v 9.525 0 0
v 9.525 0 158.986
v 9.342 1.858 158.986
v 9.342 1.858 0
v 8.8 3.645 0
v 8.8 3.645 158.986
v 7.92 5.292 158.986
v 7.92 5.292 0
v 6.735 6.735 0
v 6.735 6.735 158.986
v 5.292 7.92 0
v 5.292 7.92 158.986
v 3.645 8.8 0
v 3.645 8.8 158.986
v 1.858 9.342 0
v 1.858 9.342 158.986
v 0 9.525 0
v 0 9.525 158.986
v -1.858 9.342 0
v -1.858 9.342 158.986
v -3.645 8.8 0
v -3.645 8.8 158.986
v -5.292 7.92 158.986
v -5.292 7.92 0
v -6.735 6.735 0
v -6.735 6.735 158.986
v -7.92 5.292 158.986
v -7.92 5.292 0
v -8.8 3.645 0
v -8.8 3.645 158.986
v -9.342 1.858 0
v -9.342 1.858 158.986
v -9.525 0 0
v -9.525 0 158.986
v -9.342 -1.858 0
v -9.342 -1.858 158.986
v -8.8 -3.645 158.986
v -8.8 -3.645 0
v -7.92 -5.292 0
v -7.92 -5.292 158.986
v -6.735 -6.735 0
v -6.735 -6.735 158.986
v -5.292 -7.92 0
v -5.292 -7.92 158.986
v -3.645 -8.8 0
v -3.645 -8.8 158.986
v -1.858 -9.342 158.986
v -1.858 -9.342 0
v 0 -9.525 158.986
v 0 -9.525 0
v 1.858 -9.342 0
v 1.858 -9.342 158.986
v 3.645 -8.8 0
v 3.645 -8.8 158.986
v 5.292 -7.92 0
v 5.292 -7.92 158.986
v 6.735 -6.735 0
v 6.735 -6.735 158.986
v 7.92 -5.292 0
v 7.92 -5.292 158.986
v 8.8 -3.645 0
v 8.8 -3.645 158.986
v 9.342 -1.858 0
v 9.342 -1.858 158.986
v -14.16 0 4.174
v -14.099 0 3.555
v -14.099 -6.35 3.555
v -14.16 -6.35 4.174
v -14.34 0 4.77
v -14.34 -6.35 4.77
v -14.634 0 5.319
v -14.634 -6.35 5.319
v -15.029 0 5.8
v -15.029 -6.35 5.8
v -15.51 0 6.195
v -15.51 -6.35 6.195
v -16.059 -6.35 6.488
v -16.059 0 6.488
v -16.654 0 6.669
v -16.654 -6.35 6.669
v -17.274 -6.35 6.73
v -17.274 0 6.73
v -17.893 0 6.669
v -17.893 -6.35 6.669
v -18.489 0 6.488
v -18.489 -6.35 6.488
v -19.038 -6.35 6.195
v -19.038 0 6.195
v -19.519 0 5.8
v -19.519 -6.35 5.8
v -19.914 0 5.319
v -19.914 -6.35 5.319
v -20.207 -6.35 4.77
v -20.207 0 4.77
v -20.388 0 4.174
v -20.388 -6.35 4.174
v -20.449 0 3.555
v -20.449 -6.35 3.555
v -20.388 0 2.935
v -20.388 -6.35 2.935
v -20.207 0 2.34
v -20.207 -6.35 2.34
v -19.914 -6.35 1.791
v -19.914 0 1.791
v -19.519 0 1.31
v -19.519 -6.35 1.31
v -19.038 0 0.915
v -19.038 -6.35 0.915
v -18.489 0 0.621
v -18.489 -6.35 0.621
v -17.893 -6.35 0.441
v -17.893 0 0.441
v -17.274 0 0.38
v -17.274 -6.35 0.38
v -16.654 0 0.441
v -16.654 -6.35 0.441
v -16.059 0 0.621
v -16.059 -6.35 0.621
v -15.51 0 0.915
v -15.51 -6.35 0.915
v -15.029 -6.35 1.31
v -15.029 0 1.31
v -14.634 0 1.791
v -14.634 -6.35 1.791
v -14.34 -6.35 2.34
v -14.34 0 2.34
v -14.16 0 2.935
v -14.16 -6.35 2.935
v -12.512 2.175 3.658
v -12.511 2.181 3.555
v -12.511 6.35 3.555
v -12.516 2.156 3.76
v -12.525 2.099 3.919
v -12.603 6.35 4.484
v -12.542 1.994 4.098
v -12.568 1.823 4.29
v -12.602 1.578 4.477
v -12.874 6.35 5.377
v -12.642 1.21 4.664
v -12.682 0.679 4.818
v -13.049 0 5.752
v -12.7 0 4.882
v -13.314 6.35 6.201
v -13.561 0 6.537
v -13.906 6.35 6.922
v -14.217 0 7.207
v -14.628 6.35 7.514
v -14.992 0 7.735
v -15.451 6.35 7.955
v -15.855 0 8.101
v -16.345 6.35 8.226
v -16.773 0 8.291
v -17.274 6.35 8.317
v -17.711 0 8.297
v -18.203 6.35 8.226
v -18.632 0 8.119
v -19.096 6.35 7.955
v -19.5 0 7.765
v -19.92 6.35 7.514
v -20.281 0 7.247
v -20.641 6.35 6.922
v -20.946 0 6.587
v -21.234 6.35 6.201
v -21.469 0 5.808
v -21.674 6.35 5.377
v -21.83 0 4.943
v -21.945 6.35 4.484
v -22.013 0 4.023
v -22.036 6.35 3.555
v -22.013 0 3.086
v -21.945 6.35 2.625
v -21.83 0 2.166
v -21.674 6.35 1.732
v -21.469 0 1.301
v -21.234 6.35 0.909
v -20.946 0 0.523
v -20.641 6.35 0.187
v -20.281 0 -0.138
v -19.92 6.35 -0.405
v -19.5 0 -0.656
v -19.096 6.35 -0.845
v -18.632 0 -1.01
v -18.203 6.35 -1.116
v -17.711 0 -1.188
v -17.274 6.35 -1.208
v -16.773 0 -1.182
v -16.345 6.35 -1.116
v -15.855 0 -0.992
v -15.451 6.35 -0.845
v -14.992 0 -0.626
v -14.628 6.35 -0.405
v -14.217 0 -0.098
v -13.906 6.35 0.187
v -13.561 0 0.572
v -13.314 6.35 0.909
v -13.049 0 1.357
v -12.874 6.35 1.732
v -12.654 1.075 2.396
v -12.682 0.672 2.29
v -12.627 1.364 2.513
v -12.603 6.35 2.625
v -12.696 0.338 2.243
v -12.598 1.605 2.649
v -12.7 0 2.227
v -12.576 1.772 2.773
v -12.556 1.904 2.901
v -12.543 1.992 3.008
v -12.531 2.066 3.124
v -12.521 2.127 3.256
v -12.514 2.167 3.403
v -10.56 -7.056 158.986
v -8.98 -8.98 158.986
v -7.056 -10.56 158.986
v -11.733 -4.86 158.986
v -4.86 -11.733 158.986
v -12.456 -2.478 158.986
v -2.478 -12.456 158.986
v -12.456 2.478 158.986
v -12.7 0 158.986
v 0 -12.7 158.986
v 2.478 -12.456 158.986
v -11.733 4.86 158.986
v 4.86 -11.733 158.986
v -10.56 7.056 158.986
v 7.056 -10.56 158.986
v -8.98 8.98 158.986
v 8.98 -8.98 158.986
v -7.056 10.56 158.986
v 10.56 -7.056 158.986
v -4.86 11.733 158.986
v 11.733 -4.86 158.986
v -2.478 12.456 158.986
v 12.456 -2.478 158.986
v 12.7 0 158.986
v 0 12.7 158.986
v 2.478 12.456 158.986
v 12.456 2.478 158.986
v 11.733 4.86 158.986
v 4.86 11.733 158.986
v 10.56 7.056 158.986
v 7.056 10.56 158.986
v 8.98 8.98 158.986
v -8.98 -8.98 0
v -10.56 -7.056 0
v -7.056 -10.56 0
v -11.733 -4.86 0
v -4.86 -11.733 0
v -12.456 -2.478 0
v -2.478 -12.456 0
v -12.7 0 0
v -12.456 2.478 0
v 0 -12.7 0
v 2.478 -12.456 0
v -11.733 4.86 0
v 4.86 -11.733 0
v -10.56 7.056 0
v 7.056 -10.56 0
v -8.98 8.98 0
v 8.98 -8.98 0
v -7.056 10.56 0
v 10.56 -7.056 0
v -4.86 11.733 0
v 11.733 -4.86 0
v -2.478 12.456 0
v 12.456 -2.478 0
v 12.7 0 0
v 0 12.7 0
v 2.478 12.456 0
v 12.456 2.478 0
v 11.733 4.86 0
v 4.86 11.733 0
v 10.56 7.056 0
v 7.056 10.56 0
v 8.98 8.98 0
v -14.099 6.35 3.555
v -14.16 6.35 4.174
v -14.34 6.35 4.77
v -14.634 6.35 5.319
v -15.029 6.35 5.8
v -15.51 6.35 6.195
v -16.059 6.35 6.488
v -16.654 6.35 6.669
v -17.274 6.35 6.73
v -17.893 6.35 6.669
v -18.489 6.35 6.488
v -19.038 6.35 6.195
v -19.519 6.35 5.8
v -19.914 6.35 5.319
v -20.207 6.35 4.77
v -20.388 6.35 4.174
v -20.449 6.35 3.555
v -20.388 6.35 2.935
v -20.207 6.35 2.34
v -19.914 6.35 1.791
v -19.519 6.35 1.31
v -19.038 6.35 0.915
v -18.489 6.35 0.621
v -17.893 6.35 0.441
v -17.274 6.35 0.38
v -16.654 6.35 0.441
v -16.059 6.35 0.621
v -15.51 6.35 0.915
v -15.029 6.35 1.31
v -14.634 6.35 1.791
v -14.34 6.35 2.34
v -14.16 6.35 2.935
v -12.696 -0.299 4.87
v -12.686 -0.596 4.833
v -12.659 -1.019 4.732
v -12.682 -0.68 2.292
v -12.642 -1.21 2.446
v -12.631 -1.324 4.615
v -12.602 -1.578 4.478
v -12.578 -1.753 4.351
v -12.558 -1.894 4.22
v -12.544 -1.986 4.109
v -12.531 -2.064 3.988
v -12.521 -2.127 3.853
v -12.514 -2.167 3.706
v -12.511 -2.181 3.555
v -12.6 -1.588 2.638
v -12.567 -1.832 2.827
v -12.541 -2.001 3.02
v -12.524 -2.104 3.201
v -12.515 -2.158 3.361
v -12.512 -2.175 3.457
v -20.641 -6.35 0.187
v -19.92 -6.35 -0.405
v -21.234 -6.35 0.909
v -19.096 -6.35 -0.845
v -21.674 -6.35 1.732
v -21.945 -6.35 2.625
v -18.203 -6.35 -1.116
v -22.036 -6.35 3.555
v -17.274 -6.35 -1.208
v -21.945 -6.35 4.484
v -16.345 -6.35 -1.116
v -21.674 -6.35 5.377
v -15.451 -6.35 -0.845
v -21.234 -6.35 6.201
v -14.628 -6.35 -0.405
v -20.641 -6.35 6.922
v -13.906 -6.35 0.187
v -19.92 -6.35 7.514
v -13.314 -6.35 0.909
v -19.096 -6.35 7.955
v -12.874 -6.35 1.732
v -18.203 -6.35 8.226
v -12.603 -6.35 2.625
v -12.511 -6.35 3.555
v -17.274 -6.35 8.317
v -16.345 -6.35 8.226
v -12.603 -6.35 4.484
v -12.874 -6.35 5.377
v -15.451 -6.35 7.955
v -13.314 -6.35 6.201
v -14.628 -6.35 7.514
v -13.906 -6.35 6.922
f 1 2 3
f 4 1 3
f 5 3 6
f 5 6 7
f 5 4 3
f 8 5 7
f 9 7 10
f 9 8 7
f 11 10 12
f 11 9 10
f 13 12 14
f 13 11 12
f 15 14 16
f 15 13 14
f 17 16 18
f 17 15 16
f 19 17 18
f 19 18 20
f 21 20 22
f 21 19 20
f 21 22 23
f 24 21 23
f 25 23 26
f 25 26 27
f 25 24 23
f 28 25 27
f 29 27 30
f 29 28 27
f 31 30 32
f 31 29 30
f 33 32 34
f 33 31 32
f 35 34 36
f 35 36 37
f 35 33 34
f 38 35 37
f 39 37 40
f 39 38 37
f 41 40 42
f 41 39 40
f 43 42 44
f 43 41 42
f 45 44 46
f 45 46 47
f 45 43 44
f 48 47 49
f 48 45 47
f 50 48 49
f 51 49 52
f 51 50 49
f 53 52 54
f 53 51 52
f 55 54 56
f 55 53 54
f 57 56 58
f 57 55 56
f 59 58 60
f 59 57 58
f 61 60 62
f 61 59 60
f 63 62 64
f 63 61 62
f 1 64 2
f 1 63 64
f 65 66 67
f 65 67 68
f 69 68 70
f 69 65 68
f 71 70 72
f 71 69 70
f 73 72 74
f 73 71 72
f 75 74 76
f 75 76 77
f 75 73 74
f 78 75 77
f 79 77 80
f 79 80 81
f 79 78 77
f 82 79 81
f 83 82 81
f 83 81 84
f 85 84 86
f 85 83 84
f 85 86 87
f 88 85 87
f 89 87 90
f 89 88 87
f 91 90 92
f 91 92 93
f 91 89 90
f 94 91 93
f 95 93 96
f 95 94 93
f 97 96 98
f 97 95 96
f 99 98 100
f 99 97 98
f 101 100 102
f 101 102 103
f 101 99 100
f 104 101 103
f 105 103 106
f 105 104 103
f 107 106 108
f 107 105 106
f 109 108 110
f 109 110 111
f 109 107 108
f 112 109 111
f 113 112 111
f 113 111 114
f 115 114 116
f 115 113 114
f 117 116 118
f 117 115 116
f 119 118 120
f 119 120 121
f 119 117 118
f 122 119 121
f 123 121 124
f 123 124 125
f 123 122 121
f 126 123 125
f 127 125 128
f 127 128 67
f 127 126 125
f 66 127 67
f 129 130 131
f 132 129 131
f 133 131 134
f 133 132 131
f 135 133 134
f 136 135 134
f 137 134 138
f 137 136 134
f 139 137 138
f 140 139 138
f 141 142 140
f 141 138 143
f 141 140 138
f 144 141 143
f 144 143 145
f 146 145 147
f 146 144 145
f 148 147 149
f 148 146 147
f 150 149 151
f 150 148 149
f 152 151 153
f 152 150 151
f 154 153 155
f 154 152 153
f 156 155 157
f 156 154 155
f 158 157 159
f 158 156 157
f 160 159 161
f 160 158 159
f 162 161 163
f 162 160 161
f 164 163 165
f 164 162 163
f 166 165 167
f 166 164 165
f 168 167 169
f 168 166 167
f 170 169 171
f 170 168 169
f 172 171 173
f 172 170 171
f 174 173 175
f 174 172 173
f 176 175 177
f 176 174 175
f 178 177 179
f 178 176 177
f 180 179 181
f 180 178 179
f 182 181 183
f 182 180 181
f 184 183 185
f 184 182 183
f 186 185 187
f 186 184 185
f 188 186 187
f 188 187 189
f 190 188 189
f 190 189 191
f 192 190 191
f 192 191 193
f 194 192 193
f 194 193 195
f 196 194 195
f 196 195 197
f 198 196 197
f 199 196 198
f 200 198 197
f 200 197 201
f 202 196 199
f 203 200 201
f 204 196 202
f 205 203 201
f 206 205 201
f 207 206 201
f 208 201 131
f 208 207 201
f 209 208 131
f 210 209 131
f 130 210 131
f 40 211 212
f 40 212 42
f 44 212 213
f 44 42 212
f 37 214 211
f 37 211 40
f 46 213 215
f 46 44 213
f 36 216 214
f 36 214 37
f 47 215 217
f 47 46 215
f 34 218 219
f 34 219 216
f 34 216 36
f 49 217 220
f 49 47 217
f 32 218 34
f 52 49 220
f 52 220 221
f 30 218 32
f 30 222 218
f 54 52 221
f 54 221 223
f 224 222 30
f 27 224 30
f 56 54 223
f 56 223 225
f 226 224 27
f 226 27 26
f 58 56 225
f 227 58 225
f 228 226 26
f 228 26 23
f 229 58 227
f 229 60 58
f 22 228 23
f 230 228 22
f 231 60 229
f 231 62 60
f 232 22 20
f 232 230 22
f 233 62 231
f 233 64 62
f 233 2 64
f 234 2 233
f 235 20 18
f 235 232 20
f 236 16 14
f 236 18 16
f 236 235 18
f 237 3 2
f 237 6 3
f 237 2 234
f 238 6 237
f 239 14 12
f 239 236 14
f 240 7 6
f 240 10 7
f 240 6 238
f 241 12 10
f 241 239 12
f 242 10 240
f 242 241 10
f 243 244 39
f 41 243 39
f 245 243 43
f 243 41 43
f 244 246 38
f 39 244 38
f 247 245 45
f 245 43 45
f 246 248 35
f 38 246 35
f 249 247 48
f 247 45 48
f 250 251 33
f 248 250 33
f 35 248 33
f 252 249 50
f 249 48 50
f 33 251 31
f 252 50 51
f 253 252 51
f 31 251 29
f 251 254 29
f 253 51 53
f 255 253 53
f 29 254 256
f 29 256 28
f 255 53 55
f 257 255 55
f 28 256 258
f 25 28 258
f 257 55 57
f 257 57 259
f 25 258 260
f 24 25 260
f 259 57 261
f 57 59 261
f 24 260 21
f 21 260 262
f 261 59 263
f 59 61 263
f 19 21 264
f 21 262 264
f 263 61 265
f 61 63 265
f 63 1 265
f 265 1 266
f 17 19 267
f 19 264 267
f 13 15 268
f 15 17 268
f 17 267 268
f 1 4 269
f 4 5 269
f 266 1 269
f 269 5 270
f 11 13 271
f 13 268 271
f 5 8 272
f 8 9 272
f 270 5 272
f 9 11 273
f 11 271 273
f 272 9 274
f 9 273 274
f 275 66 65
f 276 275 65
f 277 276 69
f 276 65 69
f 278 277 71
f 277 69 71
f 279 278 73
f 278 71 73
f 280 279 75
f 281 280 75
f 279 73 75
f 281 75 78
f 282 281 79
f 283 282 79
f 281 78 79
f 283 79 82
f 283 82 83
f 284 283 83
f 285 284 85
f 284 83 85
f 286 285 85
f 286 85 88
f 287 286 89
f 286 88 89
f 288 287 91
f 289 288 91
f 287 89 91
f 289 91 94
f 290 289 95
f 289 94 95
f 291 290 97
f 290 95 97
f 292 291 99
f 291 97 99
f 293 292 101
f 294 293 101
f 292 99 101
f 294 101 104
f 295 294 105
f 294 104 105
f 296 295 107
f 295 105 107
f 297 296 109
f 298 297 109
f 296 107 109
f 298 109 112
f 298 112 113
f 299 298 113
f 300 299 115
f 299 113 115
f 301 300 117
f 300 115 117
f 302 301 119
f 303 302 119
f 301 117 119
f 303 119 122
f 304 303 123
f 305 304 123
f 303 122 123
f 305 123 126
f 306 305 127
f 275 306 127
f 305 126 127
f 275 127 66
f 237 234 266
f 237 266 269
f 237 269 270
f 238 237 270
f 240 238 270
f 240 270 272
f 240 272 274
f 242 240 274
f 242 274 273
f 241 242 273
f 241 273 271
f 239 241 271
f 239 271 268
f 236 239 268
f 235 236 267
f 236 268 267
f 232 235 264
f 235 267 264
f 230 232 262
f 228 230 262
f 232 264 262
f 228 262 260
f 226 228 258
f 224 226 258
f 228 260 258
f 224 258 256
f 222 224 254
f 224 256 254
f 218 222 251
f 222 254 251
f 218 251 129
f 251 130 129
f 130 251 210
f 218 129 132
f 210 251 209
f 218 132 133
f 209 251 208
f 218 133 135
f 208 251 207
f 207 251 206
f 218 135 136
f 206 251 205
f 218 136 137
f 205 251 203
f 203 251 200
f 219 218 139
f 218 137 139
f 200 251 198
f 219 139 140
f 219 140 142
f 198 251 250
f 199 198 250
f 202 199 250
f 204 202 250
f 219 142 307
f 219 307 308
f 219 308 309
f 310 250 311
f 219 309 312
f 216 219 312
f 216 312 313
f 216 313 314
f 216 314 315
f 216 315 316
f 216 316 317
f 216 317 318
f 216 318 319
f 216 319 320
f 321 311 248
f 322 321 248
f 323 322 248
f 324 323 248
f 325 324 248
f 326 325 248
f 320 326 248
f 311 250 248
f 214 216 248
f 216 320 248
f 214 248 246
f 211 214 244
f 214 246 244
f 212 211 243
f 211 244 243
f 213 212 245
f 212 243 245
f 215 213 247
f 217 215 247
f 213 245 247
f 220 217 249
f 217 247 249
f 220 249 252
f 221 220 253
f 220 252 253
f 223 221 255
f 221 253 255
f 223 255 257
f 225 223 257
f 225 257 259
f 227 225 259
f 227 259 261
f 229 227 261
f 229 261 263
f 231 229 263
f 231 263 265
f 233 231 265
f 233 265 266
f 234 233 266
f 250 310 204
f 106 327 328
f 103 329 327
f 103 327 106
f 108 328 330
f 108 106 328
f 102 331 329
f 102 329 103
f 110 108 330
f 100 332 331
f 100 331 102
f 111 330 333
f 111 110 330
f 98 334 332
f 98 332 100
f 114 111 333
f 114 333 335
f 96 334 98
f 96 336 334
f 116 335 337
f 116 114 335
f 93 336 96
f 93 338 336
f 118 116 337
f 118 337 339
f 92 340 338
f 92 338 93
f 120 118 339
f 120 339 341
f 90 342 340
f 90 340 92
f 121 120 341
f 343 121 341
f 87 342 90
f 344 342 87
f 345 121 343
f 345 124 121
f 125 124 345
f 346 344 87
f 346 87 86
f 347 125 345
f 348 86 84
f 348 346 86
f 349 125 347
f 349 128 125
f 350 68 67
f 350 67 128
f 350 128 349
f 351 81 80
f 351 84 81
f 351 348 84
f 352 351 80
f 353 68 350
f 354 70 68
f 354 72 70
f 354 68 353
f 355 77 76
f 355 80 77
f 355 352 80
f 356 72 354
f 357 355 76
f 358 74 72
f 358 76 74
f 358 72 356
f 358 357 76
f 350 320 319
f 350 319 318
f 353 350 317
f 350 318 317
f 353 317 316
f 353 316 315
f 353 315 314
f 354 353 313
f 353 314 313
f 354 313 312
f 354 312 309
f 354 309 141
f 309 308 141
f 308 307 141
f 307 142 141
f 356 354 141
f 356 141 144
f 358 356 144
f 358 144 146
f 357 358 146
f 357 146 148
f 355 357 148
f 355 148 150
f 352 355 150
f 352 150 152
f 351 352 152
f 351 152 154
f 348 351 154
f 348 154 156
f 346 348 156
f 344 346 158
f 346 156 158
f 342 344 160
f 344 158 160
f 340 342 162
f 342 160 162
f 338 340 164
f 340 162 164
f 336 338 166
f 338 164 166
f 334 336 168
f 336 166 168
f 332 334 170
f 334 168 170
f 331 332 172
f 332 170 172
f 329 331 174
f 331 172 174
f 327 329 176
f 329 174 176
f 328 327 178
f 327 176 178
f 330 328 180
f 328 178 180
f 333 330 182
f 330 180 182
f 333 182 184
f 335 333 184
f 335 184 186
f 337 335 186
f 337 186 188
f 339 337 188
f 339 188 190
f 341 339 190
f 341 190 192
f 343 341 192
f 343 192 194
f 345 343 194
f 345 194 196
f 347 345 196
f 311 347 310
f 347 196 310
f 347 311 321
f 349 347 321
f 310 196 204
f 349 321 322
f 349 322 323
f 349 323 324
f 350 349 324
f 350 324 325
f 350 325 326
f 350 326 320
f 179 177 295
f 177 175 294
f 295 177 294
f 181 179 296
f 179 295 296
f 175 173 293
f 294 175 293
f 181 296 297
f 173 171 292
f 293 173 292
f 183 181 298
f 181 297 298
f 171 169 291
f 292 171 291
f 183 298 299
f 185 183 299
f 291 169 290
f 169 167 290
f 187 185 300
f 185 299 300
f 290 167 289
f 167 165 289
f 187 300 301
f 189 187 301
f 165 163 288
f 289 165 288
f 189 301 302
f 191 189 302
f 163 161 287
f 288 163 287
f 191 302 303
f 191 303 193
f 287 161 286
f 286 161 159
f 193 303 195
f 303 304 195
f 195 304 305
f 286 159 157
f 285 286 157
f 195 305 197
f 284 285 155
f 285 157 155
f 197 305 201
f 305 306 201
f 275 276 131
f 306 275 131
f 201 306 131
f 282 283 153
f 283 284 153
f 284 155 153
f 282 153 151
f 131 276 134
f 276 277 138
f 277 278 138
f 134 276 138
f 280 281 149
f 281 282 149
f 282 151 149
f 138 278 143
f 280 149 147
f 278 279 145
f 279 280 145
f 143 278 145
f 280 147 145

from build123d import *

# Parameters (mm, degrees)
F0_R          = 12.7
F0_R_2        = 9.525
F1_DEPTH      = 158.98622
F2_R          = 4.7625
F2_R_2        = 3.175
F3_DEPTH      = 6.35
F3_DEPTH_BACK = 6.35


with BuildPart() as f1:
    # F0 (on Top) → F1 (new body)
    with BuildSketch(Plane.XY):
        Circle(F0_R)
        Circle(F0_R_2, mode=Mode.SUBTRACT)
    extrude(amount=F1_DEPTH)

    # F2 (on Front) → F3 (join, two sides)
    with BuildSketch(Plane.XZ) as f3_sk:
        with Locations((-17.27381, 3.554616)):
            Circle(F2_R)
        with Locations((-17.27381, 3.554616)):
            Circle(F2_R_2, mode=Mode.SUBTRACT)
    extrude(amount=F3_DEPTH)
    extrude(f3_sk.sketch, amount=-F3_DEPTH_BACK)


solid = f1.part
